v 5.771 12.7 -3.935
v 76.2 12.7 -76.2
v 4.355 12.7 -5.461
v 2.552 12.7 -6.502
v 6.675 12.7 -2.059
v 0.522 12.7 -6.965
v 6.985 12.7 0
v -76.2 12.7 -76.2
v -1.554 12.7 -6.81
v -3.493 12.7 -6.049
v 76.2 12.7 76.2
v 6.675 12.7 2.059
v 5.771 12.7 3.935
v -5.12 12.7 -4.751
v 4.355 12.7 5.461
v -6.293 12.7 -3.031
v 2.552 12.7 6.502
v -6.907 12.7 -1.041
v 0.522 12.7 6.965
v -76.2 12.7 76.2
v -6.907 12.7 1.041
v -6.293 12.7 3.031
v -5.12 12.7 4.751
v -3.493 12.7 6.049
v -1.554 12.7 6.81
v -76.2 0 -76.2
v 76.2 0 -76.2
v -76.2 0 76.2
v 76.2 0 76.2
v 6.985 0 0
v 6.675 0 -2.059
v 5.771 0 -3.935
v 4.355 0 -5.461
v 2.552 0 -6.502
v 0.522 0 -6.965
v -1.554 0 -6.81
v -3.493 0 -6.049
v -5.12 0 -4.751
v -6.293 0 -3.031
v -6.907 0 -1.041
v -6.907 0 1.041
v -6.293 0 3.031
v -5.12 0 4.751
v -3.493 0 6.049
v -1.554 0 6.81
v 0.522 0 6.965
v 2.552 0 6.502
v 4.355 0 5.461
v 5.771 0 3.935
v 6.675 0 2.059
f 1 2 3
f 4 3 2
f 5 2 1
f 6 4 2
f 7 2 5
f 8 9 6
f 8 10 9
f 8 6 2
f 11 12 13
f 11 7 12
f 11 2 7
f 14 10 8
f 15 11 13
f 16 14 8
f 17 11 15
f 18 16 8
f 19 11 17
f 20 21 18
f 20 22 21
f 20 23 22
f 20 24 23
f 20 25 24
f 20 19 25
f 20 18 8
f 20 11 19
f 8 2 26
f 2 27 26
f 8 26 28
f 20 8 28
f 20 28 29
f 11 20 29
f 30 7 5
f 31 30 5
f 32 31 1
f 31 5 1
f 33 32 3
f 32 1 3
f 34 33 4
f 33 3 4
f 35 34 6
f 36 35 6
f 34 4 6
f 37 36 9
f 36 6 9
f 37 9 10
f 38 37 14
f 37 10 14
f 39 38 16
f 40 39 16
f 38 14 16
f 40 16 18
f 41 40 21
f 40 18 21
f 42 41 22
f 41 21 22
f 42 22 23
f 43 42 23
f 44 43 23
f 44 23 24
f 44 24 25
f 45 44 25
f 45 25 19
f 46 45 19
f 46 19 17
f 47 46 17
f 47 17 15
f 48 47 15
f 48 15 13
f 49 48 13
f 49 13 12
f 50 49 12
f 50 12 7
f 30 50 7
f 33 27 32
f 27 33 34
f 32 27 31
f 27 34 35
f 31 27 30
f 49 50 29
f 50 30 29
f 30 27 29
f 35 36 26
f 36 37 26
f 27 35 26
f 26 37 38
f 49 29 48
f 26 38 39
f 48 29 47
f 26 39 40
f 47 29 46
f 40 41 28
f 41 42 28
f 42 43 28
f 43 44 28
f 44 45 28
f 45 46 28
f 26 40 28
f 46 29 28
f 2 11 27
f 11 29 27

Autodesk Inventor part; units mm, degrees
ref_plane "XZ Plane" through (0, 0, 0) normal (0, 1, 0) x (-1, 0, 0)
sketch "Sketch2" plane through (0, 0, 0) normal (0, 1, 0) x (-1, 0, 0)
  line L0 (76.2, 76.2) -> (-76.2, 76.2)
  line L1 (-76.2, 76.2) -> (-76.2, -76.2)
  line L2 (-76.2, -76.2) -> (76.2, -76.2)
  line L3 (76.2, -76.2) -> (76.2, 76.2)
  line L4 (76.2, 76.2) -> (-76.2, -76.2) construction
  line L5 (-76.2, 76.2) -> (76.2, -76.2) construction
  point P0 (0, 0)
  dimension "d0" = 152.4
extrude "Extrusion1" add sketch "Sketch2" along normal blind 12.7
sketch "Sketch3" plane through (0, 12.7, 0) normal (0, 1, 0) x (1, 0, 0)
  circle A0 centre (0, 0) radius 6.985
  dimension "d3" = 13.97
extrude "Extrusion2" cut sketch "Sketch3" against normal through all
properties part number "tableForBall"
